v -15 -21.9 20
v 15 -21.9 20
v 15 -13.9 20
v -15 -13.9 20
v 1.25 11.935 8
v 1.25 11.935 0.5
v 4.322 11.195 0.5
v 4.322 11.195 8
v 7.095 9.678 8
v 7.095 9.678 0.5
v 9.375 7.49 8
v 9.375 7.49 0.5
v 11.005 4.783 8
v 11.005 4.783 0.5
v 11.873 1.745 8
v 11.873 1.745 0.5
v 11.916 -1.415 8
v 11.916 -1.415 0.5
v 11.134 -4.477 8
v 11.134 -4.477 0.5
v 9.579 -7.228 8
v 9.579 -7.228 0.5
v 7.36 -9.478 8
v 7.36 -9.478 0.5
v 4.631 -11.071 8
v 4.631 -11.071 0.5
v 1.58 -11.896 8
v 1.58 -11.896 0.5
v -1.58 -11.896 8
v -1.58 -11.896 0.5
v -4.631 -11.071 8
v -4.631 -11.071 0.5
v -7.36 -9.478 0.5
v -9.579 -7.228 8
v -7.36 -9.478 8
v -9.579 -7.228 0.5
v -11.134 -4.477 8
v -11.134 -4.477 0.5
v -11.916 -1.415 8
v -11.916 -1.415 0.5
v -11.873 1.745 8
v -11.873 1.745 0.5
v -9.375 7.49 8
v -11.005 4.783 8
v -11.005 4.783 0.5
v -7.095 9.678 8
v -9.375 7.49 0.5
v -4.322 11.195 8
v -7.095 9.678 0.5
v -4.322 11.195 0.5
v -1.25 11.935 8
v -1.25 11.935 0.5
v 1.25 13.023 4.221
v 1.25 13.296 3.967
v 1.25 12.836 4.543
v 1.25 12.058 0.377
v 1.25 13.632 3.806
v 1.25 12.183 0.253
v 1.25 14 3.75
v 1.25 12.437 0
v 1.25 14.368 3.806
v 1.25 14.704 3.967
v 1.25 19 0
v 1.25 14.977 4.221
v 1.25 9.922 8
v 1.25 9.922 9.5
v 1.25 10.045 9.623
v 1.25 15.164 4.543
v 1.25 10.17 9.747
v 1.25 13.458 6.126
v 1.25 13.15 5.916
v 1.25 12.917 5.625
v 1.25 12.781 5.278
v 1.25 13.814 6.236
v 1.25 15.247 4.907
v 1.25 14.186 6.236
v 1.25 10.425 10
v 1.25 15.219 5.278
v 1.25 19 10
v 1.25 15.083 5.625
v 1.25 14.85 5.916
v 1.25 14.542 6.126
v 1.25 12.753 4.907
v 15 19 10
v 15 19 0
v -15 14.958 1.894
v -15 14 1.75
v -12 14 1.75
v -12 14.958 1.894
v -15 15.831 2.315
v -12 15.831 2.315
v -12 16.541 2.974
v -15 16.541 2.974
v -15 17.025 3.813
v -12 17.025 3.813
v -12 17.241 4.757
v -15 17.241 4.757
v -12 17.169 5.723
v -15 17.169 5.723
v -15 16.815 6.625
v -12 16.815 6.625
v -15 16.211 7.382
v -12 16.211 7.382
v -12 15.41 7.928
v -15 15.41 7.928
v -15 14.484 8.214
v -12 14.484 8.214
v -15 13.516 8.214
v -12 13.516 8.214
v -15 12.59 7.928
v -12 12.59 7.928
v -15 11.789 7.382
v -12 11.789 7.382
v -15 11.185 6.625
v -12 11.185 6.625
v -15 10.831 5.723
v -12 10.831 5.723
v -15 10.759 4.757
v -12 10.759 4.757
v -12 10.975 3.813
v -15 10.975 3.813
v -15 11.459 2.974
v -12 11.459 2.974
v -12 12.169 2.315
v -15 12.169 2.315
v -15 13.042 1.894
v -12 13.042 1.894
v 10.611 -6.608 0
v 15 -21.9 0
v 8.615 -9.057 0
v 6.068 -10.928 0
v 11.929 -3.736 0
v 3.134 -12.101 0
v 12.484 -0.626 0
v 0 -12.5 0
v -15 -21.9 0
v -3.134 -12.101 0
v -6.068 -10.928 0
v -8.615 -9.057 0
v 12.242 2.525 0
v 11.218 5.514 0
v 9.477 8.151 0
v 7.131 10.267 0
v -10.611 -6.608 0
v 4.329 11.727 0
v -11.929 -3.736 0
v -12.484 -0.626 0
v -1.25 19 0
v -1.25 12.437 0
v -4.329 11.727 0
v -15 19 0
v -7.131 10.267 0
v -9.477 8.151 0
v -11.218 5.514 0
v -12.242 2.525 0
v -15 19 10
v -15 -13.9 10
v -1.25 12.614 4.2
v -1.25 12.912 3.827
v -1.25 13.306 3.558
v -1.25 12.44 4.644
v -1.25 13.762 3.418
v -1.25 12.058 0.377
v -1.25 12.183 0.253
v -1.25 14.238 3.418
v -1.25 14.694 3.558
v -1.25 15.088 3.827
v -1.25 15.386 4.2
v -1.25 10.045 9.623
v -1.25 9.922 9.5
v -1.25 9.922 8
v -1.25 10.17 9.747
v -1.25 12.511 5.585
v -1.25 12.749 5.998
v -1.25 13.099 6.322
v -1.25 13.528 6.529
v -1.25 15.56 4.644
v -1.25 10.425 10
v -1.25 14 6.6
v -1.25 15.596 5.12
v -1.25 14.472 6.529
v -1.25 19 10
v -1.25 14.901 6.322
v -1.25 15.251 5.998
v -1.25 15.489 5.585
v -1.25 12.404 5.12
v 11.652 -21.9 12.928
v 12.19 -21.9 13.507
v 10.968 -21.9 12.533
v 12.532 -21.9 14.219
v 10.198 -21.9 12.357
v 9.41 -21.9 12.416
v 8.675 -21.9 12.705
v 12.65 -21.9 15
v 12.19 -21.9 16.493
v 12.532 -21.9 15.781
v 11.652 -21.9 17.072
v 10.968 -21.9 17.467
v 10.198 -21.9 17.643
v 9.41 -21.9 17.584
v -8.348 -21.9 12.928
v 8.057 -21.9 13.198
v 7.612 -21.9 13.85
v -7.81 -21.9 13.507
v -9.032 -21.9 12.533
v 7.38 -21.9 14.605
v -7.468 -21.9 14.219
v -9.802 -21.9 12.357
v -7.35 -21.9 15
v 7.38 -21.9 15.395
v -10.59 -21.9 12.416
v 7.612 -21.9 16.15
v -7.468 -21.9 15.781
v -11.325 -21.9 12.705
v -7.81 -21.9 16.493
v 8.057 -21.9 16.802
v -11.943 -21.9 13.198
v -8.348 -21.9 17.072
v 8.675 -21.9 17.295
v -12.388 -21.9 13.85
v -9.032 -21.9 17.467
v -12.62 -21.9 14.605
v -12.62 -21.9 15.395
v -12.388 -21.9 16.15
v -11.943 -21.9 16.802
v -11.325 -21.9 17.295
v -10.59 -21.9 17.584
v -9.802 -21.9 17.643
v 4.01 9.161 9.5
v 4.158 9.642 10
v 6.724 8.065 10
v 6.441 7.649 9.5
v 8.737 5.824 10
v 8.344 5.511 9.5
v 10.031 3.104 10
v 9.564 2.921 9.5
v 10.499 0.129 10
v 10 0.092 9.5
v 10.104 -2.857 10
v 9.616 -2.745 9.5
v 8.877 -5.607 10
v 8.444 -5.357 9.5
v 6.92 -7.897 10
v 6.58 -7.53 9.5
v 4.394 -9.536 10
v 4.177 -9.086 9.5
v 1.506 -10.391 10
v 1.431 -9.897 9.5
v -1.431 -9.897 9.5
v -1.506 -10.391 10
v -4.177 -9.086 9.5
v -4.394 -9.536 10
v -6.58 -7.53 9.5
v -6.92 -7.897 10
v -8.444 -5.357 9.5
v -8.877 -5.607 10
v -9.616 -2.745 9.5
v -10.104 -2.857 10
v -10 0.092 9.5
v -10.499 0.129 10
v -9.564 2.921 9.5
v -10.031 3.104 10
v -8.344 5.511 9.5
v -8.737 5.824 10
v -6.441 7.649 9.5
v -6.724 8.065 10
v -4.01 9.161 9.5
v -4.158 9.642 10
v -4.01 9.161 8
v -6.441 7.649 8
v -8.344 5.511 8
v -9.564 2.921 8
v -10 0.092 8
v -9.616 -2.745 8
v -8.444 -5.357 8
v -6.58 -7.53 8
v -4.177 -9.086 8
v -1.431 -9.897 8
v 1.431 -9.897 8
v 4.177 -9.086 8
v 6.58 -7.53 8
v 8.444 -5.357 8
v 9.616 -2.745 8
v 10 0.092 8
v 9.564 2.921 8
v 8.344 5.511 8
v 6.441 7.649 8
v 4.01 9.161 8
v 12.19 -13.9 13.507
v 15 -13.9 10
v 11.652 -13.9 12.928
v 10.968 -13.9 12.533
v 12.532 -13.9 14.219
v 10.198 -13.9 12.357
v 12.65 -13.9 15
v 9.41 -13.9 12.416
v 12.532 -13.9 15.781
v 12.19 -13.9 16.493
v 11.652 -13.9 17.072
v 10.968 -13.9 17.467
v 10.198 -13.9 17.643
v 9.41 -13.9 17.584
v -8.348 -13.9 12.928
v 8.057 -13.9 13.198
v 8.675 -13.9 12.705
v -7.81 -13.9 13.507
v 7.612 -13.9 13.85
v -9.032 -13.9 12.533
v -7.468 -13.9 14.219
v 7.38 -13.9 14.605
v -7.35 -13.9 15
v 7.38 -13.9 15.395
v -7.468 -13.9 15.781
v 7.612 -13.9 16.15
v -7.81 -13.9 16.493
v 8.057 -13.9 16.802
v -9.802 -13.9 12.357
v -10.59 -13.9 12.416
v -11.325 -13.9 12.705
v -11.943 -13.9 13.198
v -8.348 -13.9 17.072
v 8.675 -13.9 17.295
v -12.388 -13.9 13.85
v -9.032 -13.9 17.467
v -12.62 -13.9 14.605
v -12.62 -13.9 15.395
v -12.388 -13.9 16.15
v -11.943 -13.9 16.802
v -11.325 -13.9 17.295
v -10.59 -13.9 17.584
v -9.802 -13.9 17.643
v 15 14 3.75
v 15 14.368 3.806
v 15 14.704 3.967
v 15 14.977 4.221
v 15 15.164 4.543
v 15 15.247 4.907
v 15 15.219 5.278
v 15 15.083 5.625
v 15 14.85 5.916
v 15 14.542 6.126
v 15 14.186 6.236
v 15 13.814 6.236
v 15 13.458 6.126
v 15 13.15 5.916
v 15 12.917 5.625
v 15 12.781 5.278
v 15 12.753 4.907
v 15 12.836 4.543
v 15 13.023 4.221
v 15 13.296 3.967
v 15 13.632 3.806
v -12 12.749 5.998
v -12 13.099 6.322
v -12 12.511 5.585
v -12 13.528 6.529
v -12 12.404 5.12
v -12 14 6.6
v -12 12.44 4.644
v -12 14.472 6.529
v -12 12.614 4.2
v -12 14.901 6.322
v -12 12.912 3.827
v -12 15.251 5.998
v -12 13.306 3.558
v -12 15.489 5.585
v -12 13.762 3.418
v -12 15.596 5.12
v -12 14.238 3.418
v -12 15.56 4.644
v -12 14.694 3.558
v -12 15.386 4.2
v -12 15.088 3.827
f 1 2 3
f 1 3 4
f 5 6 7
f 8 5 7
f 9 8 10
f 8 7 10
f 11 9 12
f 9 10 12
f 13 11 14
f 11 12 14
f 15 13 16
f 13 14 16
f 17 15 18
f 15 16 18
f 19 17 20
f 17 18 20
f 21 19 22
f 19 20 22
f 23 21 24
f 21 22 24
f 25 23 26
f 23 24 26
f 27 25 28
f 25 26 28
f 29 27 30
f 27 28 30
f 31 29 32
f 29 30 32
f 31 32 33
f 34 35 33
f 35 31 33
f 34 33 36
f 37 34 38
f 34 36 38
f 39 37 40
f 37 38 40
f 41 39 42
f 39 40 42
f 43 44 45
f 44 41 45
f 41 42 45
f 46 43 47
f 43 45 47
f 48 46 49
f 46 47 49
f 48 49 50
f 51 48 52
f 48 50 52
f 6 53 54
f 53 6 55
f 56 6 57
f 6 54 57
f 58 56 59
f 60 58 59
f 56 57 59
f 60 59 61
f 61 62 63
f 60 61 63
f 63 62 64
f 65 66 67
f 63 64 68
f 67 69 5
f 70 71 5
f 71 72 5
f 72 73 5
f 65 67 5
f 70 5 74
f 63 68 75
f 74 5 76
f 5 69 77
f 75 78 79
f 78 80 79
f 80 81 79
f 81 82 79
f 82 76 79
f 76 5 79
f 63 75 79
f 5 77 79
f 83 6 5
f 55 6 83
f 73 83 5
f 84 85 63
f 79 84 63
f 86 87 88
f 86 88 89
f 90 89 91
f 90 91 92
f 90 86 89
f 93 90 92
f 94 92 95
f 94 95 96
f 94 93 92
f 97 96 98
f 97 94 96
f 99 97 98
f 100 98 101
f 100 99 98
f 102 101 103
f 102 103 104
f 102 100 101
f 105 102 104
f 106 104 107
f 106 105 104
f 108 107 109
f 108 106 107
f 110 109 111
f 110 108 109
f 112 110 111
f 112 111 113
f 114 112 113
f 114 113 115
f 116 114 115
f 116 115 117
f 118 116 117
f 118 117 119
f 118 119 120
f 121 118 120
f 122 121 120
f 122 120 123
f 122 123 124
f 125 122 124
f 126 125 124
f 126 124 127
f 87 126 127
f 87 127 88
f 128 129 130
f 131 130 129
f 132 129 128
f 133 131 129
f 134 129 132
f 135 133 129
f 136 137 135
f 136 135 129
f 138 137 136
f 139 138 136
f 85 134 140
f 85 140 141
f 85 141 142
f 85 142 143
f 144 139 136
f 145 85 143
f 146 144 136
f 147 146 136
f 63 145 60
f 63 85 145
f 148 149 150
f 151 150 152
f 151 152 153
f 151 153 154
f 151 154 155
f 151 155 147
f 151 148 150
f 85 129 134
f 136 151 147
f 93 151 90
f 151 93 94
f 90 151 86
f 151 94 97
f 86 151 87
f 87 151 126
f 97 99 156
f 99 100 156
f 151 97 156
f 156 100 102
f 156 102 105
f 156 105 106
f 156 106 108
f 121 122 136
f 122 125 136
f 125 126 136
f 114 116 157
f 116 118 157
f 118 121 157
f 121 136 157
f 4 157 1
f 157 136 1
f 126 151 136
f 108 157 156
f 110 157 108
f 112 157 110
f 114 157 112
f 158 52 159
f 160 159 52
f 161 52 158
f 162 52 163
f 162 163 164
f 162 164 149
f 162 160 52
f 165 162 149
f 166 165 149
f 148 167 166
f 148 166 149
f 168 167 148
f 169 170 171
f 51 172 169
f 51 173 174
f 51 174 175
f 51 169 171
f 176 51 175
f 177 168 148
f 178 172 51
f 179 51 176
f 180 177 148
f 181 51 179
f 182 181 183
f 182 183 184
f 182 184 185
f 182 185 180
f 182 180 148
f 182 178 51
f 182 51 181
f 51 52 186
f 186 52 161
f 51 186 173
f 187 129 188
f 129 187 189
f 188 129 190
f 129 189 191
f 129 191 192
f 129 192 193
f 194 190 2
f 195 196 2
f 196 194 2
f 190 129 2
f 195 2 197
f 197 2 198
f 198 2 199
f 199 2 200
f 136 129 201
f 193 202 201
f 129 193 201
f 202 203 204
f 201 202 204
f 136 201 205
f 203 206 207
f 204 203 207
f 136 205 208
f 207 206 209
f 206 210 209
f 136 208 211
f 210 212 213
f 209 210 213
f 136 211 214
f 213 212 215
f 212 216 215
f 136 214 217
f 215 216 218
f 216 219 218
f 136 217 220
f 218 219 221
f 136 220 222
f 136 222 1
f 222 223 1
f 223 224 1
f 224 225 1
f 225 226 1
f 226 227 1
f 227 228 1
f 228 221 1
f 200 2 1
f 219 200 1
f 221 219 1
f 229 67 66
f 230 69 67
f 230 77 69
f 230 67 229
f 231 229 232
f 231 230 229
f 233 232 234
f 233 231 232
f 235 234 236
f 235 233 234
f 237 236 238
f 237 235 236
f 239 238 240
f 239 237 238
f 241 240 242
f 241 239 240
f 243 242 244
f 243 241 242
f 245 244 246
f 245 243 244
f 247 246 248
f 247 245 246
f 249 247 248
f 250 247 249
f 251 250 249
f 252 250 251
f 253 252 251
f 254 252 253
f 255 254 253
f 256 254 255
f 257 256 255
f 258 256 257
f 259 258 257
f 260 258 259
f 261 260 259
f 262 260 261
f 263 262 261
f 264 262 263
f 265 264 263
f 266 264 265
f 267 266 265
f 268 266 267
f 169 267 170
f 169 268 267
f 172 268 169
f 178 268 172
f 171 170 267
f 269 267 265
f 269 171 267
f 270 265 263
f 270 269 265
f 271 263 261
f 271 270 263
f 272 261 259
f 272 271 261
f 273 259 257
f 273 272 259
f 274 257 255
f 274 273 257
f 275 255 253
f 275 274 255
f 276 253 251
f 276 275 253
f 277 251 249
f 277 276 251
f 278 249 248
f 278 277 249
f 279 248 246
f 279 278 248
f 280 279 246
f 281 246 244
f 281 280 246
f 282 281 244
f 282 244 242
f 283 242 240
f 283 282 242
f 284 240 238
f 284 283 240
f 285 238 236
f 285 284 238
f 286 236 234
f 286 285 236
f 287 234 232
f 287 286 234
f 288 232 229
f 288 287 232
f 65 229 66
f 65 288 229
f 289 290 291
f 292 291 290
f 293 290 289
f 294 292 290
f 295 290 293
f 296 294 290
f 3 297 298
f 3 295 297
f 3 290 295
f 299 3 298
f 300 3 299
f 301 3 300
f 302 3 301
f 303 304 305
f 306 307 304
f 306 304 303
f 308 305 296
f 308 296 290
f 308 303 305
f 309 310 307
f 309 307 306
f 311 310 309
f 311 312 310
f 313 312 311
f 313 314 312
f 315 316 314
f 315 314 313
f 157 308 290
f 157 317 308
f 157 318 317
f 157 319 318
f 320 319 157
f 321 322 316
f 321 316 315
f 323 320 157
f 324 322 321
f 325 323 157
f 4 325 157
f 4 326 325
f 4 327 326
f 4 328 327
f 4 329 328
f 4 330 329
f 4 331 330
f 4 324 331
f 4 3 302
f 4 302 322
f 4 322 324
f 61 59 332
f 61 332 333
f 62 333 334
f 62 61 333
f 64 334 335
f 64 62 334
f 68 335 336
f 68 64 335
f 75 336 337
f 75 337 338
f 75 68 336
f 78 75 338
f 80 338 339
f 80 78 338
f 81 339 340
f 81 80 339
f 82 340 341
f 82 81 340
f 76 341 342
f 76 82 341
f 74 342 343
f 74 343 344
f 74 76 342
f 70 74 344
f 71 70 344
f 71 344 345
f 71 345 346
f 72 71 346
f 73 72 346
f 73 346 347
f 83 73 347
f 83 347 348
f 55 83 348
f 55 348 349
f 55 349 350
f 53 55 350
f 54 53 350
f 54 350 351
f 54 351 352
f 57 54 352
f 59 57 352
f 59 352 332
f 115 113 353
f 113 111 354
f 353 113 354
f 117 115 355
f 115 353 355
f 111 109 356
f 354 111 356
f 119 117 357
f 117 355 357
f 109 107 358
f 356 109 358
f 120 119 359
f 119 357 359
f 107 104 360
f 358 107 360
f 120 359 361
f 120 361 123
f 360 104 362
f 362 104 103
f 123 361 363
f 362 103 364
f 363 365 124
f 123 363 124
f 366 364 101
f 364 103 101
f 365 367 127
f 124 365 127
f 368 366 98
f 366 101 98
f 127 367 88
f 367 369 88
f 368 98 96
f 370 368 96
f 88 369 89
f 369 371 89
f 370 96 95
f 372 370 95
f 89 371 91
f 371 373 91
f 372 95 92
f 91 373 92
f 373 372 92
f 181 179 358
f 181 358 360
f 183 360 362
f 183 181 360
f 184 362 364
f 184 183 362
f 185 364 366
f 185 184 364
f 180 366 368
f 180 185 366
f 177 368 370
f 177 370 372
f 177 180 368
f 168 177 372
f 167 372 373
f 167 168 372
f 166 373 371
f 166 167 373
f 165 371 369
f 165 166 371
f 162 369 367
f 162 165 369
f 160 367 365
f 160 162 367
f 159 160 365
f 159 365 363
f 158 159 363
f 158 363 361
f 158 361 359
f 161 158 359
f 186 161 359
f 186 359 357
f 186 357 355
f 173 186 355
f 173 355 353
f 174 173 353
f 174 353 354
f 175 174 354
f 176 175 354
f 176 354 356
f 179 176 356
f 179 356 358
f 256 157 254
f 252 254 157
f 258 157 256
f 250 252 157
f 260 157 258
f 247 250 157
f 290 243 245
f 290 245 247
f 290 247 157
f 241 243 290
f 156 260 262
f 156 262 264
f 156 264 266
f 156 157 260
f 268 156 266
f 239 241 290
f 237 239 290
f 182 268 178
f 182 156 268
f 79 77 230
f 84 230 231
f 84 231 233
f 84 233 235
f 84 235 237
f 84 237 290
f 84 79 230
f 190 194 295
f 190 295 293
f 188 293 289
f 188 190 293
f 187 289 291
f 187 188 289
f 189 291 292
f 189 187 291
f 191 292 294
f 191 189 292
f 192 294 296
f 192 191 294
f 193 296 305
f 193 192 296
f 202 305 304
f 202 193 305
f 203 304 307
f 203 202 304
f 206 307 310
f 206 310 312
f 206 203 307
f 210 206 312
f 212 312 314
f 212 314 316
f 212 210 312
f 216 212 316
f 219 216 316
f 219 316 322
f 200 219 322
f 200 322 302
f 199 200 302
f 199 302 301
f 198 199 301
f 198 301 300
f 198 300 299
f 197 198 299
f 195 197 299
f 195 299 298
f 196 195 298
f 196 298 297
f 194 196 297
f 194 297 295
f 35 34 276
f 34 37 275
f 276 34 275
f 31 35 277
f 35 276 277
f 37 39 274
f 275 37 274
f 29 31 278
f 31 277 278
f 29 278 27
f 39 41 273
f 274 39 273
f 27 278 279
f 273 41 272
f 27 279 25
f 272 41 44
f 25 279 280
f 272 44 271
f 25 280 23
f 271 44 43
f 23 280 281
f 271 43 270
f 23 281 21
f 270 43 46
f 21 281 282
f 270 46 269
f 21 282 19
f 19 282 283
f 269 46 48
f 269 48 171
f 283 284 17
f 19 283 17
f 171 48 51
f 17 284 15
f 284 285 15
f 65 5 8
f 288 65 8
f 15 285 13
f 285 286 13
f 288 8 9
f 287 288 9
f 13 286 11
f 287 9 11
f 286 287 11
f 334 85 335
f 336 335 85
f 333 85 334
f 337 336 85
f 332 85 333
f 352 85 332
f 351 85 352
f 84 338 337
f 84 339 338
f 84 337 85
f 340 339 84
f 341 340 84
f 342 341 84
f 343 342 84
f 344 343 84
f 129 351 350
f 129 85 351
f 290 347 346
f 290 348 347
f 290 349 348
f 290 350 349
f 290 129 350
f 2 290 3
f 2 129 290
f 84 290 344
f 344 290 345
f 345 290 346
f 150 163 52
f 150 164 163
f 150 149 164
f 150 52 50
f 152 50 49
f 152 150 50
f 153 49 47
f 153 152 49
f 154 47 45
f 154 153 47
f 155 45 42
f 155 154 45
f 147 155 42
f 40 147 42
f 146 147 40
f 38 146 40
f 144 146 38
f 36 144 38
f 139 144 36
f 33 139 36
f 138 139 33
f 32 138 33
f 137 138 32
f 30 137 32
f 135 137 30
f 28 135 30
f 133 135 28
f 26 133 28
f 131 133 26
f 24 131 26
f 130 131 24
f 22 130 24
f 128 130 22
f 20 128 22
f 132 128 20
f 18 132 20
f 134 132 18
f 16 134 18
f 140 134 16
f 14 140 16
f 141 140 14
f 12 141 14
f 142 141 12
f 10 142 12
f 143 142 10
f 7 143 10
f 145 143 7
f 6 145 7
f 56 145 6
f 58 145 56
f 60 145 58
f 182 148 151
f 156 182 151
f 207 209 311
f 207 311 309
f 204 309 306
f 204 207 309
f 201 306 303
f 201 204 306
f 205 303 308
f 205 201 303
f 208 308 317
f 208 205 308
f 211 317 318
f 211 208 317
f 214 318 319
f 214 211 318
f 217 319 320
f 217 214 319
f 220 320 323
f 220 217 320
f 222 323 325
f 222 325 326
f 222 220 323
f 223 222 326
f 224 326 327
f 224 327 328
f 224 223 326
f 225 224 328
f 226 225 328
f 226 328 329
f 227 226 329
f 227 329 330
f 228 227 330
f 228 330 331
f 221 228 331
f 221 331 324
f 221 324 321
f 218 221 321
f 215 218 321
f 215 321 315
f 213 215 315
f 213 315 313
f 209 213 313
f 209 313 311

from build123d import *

# Parameters (mm, degrees)
SKETCH1_W                      = 30
SKETCH1_H                      = 40.9
SKETCH1_R                      = 12
BOSS_EXTRUDE1_DEPTH            = 10
BOSS_EXTRUDE2_START            = 2
SKETCH2_R                      = 12
SKETCH2_R_2                    = 10
BOSS_EXTRUDE2_DEPTH            = 2
SKETCH3_W                      = 2.5
SKETCH3_H                      = 9.078432584
CUT_EXTRUDE1_DEPTH             = 29.365648239
CBORE_FOR_M3_SHCS1_D           = 3.2
CBORE_FOR_M3_SHCS1_DEPTH       = 13.75
CBORE_FOR_M3_SHCS1_CBORE_D     = 6.5
CBORE_FOR_M3_SHCS1_CBORE_DEPTH = 3
TAP_DRILL_FOR_M3X0_5_TAP1_D    = 2.5
CHAMFER1_SIZE                  = 0.5
SKETCH8_W                      = 30
SKETCH8_H                      = 10
BOSS_EXTRUDE3_DEPTH            = 8
M5_CLEARANCE_HOLE1_D           = 5.3


with BuildPart() as part:
    # Sketch1 → Boss-Extrude1 (new body)
    with BuildSketch(Plane.XY):
        with Locations((0, -1.45)):
            Rectangle(SKETCH1_W, SKETCH1_H)
        Circle(SKETCH1_R, mode=Mode.SUBTRACT)
    extrude(amount=BOSS_EXTRUDE1_DEPTH)

    # Sketch2 → Boss-Extrude2 (add)
    with BuildSketch(Plane(origin=(0, 0, 10), x_dir=(-1, 0, 0), z_dir=(0, 0, -1)).offset(BOSS_EXTRUDE2_START)):
        Circle(SKETCH2_R)
        Circle(SKETCH2_R_2, mode=Mode.SUBTRACT)
    extrude(amount=-BOSS_EXTRUDE2_DEPTH)

    # Sketch3 → Cut-Extrude1 (cut, through all)
    with BuildSketch(Plane.XY.offset(10)):
        with Locations((0, 14.460783708)):
            Rectangle(SKETCH3_W, SKETCH3_H)
    extrude(amount=-CUT_EXTRUDE1_DEPTH, mode=Mode.SUBTRACT)

    # CBORE for M3 SHCS1
    with Locations(Plane(origin=(15, 0, 0), x_dir=(0, 0, -1), z_dir=(1, 0, 0))):
        with Locations((-5, 14)):
            CounterBoreHole(CBORE_FOR_M3_SHCS1_D / 2, CBORE_FOR_M3_SHCS1_CBORE_D / 2, CBORE_FOR_M3_SHCS1_CBORE_DEPTH, depth=CBORE_FOR_M3_SHCS1_DEPTH)

    # Tap Drill for M3x0.5 Tap1 (through all)
    with Locations(Plane.ZY.offset(15)):
        with Locations((5, 14)):
            Hole(TAP_DRILL_FOR_M3X0_5_TAP1_D / 2)

    # Chamfer1
    chamfer1_edges = [part.edges().sort_by_distance(p)[0] for p in [
        (0, -10, 10),
        (0, -12, 0),
    ]]
    chamfer(chamfer1_edges, length=CHAMFER1_SIZE)

    # Sketch8 → Boss-Extrude3 (add)
    with BuildSketch(Plane.XZ.offset(21.9)):
        with Locations((0, 15)):
            Rectangle(SKETCH8_W, SKETCH8_H)
    extrude(amount=-BOSS_EXTRUDE3_DEPTH)

    # M5 Clearance Hole1 (through all)
    with Locations(Plane(origin=(0, -13.9, 0), x_dir=(1, 0, 0), z_dir=(0, 1, 0))):
        with Locations((-10, -15), (10, -15)):
            Hole(M5_CLEARANCE_HOLE1_D / 2)


with BuildPart() as body_2:
    # Mirror1: mirrored copy
    add(part.part.mirror(Plane(origin=(0, 0, 0), x_dir=(0, 0, 1), z_dir=(1, 0, 0))))


solid = body_2.part
